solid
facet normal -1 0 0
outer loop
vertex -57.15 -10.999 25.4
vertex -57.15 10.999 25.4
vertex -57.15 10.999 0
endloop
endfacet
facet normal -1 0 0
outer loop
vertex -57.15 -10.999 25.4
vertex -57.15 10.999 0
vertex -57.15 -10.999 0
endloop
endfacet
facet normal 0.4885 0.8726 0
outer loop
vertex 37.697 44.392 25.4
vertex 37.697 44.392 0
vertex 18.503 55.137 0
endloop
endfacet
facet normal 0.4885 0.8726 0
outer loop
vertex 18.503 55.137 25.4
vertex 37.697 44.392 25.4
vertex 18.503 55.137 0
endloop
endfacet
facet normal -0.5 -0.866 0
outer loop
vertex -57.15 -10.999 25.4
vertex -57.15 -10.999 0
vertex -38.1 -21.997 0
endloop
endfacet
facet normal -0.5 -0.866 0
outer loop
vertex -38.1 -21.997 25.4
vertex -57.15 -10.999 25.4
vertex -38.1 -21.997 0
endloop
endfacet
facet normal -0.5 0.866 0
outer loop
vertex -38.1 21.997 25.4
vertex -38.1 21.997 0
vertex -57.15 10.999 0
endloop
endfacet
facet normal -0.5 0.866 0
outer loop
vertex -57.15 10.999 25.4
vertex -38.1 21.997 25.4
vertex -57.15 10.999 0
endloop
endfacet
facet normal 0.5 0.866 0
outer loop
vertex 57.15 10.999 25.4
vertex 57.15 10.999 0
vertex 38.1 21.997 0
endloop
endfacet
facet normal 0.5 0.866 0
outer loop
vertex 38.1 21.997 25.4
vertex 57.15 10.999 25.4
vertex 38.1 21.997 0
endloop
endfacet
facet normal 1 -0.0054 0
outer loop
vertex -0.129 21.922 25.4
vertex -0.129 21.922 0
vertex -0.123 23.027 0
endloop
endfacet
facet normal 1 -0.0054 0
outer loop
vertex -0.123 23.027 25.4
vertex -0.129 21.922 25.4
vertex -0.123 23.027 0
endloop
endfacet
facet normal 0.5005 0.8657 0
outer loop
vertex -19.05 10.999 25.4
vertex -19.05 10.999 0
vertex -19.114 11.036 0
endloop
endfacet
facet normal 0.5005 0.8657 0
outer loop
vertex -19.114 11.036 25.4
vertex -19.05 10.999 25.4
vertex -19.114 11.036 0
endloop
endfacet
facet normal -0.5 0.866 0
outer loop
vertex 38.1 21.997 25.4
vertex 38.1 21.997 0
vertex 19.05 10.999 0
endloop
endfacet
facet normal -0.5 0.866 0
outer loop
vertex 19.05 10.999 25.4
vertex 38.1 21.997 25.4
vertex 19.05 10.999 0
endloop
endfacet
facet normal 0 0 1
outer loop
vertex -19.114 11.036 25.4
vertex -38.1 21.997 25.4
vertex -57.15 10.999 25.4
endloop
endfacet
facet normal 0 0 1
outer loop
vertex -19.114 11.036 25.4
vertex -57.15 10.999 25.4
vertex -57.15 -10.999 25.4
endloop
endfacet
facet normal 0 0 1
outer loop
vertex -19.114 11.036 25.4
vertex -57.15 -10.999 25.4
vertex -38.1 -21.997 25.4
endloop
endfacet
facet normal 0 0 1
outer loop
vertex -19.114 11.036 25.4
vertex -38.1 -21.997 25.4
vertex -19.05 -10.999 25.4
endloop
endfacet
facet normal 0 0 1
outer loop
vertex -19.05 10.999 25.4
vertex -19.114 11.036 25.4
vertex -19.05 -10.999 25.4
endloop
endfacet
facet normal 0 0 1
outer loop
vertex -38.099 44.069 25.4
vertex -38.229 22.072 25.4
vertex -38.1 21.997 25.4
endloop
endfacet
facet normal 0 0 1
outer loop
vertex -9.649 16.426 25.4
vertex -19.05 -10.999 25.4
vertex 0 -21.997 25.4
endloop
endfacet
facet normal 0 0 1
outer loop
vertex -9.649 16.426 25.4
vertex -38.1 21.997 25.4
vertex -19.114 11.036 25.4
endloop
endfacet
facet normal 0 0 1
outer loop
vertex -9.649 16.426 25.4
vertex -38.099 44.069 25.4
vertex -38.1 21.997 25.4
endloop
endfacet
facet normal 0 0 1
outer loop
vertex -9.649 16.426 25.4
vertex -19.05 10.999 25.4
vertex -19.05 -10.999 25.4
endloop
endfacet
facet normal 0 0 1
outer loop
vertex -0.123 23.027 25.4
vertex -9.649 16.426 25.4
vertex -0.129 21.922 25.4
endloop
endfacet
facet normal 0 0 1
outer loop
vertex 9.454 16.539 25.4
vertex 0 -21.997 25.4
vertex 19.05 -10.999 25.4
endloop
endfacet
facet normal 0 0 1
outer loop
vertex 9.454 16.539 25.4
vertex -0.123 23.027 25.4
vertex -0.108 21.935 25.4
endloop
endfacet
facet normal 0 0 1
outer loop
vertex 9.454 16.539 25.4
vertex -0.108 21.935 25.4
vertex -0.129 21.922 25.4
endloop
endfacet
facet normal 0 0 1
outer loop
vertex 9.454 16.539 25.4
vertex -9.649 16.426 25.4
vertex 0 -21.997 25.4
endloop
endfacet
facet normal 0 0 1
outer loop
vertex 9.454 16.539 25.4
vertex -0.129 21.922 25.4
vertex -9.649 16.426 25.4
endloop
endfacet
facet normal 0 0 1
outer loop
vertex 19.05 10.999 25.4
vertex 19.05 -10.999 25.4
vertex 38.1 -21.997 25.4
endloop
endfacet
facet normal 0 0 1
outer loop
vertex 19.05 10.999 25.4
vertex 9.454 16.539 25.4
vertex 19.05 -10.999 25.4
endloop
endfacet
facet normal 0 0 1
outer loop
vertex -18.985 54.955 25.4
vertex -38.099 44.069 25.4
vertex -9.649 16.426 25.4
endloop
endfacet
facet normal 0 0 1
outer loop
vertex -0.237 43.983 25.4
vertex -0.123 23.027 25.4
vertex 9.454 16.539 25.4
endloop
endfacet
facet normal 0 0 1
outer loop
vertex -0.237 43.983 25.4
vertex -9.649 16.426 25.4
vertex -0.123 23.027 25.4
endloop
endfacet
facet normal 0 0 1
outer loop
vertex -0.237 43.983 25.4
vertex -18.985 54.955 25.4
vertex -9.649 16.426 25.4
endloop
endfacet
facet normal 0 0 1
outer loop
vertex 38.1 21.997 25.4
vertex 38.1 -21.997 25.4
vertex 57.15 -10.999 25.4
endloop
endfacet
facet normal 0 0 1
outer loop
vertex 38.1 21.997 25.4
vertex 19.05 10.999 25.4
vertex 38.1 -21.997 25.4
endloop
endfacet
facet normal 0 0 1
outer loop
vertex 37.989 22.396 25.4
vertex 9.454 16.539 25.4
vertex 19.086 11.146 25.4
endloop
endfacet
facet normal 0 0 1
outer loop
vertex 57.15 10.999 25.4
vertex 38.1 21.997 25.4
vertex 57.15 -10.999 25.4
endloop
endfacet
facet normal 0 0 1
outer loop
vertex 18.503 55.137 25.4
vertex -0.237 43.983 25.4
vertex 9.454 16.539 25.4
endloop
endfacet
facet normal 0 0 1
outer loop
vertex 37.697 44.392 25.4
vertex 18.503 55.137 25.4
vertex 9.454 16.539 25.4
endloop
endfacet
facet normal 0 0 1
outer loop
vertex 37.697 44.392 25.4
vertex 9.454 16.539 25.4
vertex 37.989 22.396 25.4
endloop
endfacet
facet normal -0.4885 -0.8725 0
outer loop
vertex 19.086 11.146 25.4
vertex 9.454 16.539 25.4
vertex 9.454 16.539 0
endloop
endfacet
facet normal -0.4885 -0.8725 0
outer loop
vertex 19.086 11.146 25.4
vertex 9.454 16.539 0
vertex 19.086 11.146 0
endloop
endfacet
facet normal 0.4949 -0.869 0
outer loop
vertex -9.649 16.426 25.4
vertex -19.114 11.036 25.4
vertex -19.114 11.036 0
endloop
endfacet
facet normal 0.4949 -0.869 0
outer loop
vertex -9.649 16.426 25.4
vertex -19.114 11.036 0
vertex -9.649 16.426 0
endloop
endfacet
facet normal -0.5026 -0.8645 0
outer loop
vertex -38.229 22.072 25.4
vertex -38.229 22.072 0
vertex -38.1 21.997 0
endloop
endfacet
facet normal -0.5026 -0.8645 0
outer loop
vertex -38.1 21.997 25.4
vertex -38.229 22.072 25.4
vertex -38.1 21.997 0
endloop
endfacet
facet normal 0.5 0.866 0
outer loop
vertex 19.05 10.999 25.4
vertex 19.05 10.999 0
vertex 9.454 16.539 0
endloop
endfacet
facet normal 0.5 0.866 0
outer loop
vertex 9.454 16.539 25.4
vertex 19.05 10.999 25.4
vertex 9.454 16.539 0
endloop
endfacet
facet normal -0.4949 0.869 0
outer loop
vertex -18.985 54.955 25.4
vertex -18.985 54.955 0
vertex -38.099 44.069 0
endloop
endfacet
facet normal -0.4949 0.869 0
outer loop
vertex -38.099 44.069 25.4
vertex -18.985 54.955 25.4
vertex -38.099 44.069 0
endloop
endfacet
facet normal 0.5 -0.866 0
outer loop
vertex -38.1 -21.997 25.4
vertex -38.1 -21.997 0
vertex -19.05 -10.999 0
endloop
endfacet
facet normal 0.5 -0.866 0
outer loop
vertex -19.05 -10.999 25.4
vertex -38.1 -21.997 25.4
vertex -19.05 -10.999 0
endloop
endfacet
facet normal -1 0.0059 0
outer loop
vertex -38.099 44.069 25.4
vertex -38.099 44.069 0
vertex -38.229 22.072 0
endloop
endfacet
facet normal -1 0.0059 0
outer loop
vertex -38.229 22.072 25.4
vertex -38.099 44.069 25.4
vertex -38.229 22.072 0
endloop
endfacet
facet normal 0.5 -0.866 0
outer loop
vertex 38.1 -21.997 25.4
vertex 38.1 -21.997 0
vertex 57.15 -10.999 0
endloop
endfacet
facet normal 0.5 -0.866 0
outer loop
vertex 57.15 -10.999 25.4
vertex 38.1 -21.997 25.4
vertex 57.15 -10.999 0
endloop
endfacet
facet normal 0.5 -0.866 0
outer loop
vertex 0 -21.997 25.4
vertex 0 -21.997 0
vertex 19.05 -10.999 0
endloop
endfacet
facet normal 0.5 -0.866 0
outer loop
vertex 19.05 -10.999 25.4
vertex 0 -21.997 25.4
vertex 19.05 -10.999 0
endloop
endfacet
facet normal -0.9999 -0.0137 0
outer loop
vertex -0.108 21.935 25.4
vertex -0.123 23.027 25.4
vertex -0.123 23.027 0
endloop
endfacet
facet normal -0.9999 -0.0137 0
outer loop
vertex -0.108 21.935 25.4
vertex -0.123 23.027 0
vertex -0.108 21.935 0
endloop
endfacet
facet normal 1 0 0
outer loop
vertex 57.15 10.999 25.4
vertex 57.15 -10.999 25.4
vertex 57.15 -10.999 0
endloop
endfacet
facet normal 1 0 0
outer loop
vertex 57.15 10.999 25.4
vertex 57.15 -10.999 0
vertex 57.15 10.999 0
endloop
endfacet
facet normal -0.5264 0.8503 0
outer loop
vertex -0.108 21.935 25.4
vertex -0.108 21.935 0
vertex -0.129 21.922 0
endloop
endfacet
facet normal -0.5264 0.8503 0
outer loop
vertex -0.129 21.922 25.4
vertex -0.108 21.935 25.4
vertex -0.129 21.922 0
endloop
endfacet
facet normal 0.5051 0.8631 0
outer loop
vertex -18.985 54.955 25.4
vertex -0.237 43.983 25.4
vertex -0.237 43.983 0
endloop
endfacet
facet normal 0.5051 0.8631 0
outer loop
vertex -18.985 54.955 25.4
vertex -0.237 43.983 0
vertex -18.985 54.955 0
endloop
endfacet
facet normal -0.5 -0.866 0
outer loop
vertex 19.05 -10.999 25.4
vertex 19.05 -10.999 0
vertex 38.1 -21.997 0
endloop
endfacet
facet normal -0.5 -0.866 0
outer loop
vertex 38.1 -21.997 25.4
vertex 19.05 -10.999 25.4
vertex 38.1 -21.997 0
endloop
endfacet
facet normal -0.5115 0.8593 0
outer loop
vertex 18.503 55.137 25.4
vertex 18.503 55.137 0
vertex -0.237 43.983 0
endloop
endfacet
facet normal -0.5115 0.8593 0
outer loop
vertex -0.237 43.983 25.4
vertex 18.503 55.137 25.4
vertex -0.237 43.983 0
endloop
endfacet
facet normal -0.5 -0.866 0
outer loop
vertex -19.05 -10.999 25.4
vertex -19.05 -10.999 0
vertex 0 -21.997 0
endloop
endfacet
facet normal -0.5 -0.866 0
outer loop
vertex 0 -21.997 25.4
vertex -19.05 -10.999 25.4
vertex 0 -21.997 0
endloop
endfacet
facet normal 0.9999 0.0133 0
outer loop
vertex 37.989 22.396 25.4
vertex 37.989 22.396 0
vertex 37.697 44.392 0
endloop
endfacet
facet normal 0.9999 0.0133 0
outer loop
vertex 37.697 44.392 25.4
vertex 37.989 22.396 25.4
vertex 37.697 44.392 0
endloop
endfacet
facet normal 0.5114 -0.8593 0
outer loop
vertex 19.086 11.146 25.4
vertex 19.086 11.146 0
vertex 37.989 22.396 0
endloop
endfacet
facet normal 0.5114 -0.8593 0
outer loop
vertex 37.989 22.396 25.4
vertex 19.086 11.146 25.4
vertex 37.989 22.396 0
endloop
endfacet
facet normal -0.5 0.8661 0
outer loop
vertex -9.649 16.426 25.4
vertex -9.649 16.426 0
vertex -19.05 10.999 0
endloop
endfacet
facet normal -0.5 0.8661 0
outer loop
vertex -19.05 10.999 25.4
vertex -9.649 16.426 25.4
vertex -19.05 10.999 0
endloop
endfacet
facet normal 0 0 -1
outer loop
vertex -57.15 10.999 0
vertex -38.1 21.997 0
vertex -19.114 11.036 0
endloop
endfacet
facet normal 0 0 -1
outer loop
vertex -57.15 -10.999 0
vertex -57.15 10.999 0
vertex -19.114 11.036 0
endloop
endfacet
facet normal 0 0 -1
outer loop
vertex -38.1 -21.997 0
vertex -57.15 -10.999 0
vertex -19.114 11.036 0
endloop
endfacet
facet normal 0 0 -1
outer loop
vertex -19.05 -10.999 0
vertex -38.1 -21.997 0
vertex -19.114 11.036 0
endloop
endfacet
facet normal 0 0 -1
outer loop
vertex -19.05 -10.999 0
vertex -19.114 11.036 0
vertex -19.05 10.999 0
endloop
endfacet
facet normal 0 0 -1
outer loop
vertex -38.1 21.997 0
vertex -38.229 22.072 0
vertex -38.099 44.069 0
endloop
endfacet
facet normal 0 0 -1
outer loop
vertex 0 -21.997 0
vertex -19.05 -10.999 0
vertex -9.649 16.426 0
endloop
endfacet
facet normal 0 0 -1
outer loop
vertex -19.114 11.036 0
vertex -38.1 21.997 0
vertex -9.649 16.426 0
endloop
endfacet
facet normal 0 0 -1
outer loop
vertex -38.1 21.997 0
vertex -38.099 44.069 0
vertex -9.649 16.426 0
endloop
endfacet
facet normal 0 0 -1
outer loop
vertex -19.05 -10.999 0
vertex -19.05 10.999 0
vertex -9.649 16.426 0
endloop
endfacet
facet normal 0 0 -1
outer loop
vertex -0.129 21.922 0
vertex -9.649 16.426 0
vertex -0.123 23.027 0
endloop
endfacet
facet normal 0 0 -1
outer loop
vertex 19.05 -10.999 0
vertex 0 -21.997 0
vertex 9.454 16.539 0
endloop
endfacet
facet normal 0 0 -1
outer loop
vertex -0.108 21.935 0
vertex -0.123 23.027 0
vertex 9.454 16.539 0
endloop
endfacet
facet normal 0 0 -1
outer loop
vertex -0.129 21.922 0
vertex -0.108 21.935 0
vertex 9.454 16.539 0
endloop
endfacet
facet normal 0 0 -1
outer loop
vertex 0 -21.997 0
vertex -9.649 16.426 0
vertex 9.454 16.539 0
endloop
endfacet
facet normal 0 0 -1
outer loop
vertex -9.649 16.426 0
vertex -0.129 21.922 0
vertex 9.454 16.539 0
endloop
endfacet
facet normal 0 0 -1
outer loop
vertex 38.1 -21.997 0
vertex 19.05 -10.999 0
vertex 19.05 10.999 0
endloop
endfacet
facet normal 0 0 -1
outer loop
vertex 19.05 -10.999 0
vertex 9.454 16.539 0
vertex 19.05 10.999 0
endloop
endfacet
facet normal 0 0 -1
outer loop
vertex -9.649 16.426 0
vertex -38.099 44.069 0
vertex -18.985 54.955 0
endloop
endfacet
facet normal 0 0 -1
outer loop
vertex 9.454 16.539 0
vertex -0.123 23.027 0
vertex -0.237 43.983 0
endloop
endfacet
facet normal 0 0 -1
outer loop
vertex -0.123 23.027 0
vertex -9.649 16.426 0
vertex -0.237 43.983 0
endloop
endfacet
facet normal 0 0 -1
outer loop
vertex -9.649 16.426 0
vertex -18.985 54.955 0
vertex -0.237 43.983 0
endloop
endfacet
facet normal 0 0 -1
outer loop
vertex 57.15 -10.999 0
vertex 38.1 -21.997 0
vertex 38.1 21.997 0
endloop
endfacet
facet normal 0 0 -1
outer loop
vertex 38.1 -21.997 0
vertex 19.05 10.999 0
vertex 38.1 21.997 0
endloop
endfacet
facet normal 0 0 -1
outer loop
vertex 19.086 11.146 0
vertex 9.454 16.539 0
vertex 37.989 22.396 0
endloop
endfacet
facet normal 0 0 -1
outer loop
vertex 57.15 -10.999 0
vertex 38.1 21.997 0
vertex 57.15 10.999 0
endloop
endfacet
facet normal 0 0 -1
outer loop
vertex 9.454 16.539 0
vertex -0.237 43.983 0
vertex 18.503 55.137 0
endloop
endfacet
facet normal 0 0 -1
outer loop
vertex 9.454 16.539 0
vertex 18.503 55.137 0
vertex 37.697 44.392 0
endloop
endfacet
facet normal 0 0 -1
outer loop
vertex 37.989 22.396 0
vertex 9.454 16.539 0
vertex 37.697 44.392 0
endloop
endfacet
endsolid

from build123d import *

# Parameters (mm, degrees)
F1_DEPTH = 25.4
F6_DEPTH = 25.4
F7_DEPTH = 25.4
F8_DEPTH = 25.4
F9_DEPTH = 25.4


with BuildPart() as f1:
    # F0 (on Top) → F1 (new body)
    with BuildSketch(Plane.XY):
        Polygon((19.05, -10.998523), (19.05, 10.998523), (0, 21.997045), (-19.05, 10.998523), (-19.05, -10.998523), (0, -21.997045), align=None)
    extrude(amount=F1_DEPTH)

    # F5 (on Top) → F6 (join)
    with BuildSketch(Plane.XY):
        Polygon((-19.244213, 10.961572), (-0.129696, 21.847583), (0, 43.844246), (-18.984821, 54.954898), (-38.099338, 44.068886), (-38.229034, 22.072224), align=None)
    extrude(amount=F6_DEPTH)

    # F4 (on Top) → F7 (join)
    with BuildSketch(Plane.XY):
        Polygon((-19.05, -10.998523), (-19.05, 10.998523), (-38.1, 21.997045), (-57.15, 10.998523), (-57.15, -10.998523), (-38.1, -21.997045), align=None)
    extrude(amount=F7_DEPTH)

    # F3 (on Top) → F8 (join)
    with BuildSketch(Plane.XY):
        Polygon((19.086355, 11.146432), (37.988951, 22.396404), (37.697487, 44.391519), (18.503427, 55.13666), (-0.399169, 43.886688), (-0.107704, 21.891573), align=None)
    extrude(amount=F8_DEPTH)

    # F2 (on Top) → F9 (join)
    with BuildSketch(Plane.XY):
        Polygon((19.05, 10.998523), (19.05, -10.998523), (38.1, -21.997045), (57.15, -10.998523), (57.15, 10.998523), (38.1, 21.997045), align=None)
    extrude(amount=F9_DEPTH)


solid = f1.part
